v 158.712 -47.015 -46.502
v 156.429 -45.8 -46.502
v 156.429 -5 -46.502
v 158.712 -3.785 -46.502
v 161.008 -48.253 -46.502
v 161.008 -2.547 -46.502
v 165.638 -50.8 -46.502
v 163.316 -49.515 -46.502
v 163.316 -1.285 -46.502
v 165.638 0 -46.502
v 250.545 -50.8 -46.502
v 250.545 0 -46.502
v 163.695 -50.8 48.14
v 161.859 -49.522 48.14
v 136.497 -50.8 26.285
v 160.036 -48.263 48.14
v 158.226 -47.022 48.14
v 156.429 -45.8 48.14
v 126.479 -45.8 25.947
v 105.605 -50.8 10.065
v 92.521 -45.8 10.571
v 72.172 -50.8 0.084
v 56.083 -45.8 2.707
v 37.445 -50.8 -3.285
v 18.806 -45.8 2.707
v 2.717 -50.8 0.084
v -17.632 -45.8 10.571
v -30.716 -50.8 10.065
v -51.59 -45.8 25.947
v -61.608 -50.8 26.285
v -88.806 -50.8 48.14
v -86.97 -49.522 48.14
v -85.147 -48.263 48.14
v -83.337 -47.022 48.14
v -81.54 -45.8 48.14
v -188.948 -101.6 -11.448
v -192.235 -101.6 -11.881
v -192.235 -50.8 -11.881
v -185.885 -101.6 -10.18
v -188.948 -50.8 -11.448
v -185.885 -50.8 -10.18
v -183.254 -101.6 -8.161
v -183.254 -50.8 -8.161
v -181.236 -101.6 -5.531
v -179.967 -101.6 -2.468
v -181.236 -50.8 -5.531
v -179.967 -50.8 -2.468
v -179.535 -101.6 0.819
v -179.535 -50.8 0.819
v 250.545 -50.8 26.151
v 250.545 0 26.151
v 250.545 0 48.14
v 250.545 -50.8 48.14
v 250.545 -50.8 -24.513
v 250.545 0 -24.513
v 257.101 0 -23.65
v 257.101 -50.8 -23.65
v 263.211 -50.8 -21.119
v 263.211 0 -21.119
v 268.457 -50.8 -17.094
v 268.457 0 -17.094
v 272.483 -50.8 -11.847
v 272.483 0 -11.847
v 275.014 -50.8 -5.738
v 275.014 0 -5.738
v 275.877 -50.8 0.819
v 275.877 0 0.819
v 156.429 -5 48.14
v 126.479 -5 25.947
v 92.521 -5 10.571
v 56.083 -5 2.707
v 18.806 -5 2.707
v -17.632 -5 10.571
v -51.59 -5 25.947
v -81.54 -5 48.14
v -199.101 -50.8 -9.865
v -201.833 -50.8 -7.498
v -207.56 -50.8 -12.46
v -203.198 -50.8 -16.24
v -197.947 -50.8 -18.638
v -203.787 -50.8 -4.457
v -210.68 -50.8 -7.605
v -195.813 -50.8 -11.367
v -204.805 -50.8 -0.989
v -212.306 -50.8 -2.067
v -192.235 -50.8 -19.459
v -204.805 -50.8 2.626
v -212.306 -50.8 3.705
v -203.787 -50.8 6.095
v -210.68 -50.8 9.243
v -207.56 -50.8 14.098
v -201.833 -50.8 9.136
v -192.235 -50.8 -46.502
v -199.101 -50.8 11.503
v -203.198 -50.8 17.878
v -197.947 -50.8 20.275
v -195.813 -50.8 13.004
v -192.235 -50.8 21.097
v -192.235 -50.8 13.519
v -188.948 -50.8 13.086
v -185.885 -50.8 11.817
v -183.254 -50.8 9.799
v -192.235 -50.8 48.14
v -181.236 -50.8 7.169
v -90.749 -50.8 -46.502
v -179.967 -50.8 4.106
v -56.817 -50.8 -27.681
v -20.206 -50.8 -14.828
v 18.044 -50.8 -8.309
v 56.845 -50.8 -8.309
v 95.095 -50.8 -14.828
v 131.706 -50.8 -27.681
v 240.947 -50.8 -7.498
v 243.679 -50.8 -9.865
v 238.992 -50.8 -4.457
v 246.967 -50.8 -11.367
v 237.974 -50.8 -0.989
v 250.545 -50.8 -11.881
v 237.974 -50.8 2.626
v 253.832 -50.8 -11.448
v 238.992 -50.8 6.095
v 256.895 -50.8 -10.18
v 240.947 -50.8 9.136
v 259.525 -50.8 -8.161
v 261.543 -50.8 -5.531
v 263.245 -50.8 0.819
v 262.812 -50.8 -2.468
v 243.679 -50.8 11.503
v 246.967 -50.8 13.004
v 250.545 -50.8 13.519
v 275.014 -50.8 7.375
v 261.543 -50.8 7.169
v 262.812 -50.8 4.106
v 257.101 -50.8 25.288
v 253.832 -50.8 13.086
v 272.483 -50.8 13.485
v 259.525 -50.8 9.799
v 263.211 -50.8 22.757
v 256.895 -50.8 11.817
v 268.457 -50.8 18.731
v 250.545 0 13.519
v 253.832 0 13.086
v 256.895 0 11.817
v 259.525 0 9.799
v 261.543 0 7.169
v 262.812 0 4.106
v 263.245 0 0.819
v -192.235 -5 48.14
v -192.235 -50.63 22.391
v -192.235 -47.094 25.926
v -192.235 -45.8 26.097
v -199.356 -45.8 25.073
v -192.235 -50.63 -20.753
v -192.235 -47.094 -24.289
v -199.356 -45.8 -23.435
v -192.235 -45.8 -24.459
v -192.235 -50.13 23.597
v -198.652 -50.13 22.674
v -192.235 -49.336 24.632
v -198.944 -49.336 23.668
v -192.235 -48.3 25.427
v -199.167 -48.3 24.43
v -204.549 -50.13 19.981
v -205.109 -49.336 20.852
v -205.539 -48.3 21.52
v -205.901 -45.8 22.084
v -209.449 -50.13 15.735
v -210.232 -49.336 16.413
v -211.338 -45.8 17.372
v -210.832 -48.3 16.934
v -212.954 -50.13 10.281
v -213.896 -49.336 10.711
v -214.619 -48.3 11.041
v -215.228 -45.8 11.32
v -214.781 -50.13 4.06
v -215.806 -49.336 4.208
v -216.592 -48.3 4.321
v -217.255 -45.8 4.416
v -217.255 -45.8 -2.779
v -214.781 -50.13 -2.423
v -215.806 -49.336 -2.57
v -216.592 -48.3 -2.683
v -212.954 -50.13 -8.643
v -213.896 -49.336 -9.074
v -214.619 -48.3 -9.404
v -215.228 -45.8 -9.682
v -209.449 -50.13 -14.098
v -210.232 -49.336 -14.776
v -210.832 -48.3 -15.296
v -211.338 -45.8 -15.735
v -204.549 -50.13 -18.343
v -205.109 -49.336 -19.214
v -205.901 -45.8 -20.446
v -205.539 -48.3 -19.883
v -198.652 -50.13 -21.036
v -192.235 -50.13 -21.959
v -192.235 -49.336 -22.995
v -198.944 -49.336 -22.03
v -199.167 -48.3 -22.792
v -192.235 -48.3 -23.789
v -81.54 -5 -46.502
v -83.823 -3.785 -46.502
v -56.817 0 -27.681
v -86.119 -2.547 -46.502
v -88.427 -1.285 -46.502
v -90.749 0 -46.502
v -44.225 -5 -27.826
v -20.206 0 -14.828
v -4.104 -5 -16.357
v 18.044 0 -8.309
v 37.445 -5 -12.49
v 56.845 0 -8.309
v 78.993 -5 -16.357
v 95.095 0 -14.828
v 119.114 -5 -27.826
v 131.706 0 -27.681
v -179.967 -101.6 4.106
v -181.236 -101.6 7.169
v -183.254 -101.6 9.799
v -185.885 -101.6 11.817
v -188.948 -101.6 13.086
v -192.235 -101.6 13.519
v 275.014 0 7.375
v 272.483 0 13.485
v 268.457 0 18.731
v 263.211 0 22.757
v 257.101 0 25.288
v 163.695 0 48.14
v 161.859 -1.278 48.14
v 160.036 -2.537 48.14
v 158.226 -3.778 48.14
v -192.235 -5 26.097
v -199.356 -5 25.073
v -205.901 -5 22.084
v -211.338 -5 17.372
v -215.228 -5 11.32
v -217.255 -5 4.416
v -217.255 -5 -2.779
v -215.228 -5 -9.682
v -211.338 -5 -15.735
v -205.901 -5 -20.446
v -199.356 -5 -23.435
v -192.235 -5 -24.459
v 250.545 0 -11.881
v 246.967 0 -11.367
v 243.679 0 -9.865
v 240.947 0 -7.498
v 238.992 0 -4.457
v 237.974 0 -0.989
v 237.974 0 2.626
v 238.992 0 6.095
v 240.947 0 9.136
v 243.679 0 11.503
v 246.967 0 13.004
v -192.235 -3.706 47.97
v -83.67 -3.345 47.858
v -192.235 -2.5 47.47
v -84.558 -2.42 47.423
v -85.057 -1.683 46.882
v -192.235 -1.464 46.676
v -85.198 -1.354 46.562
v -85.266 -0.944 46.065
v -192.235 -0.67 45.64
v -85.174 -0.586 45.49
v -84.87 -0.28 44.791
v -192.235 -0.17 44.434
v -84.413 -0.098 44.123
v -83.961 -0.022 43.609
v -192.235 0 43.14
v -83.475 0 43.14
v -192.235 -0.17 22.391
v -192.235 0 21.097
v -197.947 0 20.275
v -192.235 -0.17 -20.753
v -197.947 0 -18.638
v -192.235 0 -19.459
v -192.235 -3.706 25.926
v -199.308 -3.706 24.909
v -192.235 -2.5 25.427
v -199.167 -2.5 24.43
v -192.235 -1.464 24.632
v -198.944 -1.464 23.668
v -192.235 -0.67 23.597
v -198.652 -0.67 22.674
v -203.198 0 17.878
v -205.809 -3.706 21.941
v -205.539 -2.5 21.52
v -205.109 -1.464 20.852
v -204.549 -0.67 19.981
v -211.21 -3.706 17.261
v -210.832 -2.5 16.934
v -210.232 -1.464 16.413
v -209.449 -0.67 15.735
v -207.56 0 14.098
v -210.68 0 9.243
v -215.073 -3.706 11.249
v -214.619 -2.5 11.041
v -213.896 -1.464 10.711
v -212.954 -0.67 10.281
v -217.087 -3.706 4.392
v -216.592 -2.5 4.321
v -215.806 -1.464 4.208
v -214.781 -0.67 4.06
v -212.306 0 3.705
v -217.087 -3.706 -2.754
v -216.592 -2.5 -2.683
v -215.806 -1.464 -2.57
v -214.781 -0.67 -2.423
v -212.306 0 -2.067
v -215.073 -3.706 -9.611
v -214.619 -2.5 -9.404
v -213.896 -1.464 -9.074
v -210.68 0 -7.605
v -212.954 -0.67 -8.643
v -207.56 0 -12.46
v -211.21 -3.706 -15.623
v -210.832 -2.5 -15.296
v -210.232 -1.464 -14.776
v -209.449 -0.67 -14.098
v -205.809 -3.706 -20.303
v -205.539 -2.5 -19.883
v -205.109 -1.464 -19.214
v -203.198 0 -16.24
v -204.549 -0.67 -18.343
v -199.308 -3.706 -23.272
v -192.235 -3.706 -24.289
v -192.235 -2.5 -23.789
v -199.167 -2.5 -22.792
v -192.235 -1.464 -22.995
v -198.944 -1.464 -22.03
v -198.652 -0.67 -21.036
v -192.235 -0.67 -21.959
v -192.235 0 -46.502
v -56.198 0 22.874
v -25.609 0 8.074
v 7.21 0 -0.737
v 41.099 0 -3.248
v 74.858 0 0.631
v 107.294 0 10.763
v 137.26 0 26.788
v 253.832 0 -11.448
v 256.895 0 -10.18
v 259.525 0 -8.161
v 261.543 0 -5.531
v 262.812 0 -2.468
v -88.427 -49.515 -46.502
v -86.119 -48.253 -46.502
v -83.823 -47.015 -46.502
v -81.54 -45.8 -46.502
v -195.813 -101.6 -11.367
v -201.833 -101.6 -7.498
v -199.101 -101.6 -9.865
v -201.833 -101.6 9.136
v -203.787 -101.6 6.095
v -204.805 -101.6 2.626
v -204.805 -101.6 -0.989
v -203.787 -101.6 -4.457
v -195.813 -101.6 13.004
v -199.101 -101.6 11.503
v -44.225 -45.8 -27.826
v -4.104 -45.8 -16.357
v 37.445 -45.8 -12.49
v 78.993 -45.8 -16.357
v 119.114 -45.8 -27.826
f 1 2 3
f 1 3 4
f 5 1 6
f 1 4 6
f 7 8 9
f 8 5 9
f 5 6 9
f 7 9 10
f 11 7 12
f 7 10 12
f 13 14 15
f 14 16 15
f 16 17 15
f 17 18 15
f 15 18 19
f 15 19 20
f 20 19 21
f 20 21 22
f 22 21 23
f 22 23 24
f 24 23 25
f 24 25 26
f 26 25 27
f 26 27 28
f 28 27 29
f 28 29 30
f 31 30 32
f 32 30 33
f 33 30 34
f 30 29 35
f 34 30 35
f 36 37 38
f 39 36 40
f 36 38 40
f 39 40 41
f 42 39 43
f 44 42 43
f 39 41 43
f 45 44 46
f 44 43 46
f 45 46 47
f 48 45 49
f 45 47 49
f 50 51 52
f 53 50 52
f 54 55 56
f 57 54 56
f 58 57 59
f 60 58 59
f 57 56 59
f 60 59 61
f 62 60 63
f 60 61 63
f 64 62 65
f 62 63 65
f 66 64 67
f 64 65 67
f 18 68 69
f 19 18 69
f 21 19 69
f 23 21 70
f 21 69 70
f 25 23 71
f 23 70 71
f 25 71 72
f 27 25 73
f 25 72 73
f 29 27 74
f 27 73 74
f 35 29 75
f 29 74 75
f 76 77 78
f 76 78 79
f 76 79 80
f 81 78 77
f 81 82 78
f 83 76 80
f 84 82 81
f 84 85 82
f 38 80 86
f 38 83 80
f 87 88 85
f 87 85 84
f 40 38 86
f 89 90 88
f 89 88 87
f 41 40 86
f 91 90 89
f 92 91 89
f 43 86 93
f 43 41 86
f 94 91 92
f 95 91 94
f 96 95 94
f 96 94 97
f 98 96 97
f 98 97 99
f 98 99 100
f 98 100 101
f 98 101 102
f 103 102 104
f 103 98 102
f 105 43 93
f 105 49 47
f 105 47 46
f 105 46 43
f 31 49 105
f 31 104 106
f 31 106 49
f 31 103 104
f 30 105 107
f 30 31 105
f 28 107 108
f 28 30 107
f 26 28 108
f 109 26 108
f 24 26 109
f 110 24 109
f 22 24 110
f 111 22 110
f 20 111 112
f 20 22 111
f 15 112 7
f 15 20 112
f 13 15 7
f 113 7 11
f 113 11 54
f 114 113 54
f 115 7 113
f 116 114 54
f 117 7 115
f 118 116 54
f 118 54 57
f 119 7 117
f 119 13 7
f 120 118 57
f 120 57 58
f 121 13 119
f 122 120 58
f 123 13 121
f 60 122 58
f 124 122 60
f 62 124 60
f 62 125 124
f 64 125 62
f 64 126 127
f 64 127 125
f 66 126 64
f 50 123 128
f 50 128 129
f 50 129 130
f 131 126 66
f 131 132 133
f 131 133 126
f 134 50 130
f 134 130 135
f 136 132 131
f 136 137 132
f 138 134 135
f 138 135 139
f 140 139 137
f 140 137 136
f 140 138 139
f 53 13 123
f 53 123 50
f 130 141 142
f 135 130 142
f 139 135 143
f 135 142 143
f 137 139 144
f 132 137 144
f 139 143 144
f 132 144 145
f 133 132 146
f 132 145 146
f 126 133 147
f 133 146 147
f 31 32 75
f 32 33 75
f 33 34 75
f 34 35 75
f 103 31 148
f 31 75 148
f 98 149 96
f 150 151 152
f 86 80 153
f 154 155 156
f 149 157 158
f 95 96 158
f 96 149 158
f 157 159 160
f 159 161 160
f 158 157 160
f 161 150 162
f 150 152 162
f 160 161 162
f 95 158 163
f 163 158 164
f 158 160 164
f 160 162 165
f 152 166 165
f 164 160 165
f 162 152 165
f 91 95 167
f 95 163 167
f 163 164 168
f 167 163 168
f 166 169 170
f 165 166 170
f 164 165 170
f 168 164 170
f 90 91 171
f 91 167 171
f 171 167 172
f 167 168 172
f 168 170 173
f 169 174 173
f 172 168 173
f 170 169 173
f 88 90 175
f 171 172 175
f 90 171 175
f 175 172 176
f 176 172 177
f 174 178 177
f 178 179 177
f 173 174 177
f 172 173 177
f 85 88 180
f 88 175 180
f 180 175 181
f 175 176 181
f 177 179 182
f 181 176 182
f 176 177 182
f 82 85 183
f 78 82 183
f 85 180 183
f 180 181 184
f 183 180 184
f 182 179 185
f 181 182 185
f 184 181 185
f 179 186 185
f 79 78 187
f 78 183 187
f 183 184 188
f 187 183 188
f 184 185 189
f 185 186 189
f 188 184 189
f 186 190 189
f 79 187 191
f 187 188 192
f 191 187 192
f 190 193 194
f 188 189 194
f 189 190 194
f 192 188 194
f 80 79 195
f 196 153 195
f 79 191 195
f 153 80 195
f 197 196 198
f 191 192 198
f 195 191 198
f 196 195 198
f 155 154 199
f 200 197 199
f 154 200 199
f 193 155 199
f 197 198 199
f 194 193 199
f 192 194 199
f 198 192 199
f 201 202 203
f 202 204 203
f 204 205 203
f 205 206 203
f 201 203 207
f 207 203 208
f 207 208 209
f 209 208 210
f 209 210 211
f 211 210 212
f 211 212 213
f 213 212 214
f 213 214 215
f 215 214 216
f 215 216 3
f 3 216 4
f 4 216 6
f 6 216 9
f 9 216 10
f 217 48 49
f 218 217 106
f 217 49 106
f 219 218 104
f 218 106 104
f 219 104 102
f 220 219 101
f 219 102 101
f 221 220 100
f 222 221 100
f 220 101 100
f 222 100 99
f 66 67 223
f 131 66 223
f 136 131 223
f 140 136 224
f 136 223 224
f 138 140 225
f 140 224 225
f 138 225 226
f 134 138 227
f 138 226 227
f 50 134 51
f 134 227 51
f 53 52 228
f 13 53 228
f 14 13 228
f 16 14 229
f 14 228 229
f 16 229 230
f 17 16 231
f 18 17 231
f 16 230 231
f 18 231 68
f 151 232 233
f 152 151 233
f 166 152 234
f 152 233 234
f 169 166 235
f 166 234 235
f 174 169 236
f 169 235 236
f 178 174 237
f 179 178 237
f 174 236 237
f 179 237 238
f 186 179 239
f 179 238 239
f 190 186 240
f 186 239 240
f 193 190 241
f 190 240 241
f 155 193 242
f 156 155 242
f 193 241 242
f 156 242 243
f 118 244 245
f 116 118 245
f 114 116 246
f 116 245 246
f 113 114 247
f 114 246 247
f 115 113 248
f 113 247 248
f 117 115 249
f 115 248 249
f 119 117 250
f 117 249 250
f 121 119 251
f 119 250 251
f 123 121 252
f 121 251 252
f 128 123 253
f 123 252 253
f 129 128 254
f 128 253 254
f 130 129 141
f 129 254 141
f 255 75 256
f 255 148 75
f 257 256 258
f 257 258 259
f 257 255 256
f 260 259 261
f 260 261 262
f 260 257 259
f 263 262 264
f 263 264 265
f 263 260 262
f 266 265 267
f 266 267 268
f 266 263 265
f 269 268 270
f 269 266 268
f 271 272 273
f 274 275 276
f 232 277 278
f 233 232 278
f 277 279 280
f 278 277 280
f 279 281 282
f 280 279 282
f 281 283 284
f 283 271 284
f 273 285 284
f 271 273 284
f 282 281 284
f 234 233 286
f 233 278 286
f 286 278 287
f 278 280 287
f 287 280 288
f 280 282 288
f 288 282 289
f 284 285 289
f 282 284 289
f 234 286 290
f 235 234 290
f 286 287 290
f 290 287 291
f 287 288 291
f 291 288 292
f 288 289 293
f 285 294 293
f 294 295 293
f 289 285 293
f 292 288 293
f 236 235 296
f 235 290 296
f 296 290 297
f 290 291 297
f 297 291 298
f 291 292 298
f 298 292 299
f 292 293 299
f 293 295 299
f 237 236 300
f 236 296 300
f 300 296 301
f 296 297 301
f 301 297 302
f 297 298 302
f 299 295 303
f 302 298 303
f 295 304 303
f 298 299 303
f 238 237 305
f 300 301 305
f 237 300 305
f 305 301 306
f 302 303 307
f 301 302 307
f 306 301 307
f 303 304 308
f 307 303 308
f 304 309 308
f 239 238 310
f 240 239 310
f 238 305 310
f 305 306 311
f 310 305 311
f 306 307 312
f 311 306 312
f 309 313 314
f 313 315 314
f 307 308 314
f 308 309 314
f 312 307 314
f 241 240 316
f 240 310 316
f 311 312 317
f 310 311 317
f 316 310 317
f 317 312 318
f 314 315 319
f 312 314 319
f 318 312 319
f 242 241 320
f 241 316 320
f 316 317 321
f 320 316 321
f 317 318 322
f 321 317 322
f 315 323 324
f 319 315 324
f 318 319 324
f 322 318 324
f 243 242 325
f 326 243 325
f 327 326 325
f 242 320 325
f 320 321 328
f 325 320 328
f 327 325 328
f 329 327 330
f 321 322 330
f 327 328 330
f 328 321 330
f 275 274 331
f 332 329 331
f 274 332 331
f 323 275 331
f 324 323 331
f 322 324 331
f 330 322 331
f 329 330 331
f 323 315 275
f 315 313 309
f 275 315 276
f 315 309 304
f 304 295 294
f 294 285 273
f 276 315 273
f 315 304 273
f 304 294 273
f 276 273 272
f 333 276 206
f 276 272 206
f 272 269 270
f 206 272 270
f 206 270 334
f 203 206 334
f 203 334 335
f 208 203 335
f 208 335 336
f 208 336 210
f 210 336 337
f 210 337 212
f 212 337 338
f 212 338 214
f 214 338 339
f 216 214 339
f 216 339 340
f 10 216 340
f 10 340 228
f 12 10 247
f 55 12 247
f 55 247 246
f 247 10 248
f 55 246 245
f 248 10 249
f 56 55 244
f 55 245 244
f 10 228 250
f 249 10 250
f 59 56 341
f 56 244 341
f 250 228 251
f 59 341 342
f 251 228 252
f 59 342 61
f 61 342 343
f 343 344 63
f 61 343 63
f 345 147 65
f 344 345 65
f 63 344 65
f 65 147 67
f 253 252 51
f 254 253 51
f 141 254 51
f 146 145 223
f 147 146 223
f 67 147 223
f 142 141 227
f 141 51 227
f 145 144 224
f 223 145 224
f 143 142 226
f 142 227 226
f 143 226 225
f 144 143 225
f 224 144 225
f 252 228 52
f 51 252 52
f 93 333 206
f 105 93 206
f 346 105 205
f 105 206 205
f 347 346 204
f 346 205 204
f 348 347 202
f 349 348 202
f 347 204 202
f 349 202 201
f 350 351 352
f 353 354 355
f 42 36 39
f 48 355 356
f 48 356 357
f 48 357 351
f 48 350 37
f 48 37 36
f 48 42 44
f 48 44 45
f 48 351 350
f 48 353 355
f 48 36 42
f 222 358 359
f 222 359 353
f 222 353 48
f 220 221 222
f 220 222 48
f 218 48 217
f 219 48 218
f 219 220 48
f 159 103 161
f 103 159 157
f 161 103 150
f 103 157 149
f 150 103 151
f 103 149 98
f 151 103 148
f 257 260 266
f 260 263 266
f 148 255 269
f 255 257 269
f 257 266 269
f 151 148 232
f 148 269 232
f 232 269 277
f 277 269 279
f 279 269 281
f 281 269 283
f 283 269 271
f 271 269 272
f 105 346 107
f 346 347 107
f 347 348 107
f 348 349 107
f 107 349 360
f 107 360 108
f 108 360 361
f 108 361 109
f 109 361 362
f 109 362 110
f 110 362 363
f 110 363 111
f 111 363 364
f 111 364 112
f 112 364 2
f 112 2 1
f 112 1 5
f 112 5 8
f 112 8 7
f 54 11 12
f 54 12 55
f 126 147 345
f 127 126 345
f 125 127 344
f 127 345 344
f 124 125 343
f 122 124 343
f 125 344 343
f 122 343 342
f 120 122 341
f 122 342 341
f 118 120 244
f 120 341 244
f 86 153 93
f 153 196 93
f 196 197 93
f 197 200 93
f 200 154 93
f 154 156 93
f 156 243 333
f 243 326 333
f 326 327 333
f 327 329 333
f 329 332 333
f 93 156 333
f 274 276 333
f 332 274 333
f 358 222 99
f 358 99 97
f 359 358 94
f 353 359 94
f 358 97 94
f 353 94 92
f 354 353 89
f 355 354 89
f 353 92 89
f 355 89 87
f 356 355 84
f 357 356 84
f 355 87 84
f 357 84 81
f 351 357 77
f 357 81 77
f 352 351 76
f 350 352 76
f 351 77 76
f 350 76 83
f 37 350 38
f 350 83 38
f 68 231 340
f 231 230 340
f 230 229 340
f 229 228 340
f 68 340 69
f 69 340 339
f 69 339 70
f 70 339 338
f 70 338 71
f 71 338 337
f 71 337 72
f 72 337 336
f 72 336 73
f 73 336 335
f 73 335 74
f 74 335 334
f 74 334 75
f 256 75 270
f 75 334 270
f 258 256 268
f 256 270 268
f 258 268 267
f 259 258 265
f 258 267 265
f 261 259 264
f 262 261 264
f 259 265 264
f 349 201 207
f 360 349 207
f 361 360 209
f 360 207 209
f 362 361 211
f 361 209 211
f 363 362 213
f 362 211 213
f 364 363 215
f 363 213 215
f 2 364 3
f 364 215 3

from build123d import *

# Parameters (mm, degrees)
F1_DEPTH = 50.8
F2_DEPTH = 50.8
F3_DEPTH = 25.4
F4_DEPTH = 101.6
F5_SIZE  = 5
F6_R     = 5


with BuildPart() as f1:
    # F0 (on Front) → F1 (new body)
    with BuildSketch(Plane.XZ):
        with BuildLine():
            Line((-81.5396818683, 48.140194267), (-192.2345156552, 48.140194267))
            Line((-192.2345156552, 48.140194267), (-192.2345156552, 26.0968099283))
            ThreePointArc((-192.2345156552, 26.0968099283), (-174.3603015656, 18.6930680356), (-166.956559673, 0.8188539461))
            ThreePointArc((-166.956559673, 0.8188539461), (-174.3603015656, -17.0553601435), (-192.2345156552, -24.4591020361))
            Line((-192.2345156552, -24.4591020361), (-192.2345156552, -46.5024863749))
            Line((-192.2345156552, -46.5024863749), (-81.5396818683, -46.5024863749))
            ThreePointArc((-81.5396818683, -46.5024863749), (37.4445138693, -12.4899673839), (156.4287096069, -46.5024863749))
            Line((156.4287096069, -46.5024863749), (250.5448194923, -46.5024863749))
            Line((250.5448194923, -46.5024863749), (250.5448194923, -24.5132009882))
            ThreePointArc((250.5448194923, -24.5132009882), (225.212764558, 0.8188539461), (250.5448194923, 26.1509088804))
            Line((250.5448194923, 26.1509088804), (250.5448194923, 48.140194267))
            Line((250.5448194923, 48.140194267), (156.4287096069, 48.140194267))
            ThreePointArc((156.4287096069, 48.140194267), (37.4445138693, 1.7154132922), (-81.5396818683, 48.140194267))
        make_face()
    extrude(amount=F1_DEPTH)

    # F0 (on Front) → F2 (join)
    with BuildSketch(Plane.XZ):
        with BuildLine():
            Line((-81.5396818683, 48.140194267), (-192.2345156552, 48.140194267))
            Line((-192.2345156552, 48.140194267), (-192.2345156552, 26.0968099283))
            ThreePointArc((-192.2345156552, 26.0968099283), (-174.3603015656, 18.6930680356), (-166.956559673, 0.8188539461))
            ThreePointArc((-166.956559673, 0.8188539461), (-174.3603015656, -17.0553601435), (-192.2345156552, -24.4591020361))
            Line((-192.2345156552, -24.4591020361), (-192.2345156552, -46.5024863749))
            Line((-192.2345156552, -46.5024863749), (-81.5396818683, -46.5024863749))
            ThreePointArc((-81.5396818683, -46.5024863749), (37.4445138693, -12.4899673839), (156.4287096069, -46.5024863749))
            Line((156.4287096069, -46.5024863749), (250.5448194923, -46.5024863749))
            Line((250.5448194923, -46.5024863749), (250.5448194923, -24.5132009882))
            ThreePointArc((250.5448194923, -24.5132009882), (225.212764558, 0.8188539461), (250.5448194923, 26.1509088804))
            Line((250.5448194923, 26.1509088804), (250.5448194923, 48.140194267))
            Line((250.5448194923, 48.140194267), (156.4287096069, 48.140194267))
            ThreePointArc((156.4287096069, 48.140194267), (37.4445138693, 1.7154132922), (-81.5396818683, 48.140194267))
        make_face()
        with BuildLine():
            ThreePointArc((-166.956559673, 0.8188539461), (-174.3603015656, 18.6930680356), (-192.2345156552, 26.0968099283))
            Line((-192.2345156552, 26.0968099283), (-192.2345156552, 13.5188539461))
            ThreePointArc((-192.2345156552, 13.5188539461), (-183.2542595341, 9.7991100672), (-179.5345156552, 0.8188539461))
            ThreePointArc((-179.5345156552, 0.8188539461), (-183.2542595341, -8.161402175), (-192.2345156552, -11.8811460539))
            Line((-192.2345156552, -11.8811460539), (-192.2345156552, -24.4591020361))
            ThreePointArc((-192.2345156552, -24.4591020361), (-174.3603015656, -17.0553601435), (-166.956559673, 0.8188539461))
        make_face()
        with BuildLine():
            Line((-192.2345156552, 13.5188539461), (-192.2345156552, 26.0968099283))
            ThreePointArc((-192.2345156552, 26.0968099283), (-217.5124716374, 0.8188539461), (-192.2345156552, -24.4591020361))
            Line((-192.2345156552, -24.4591020361), (-192.2345156552, -11.8811460539))
            ThreePointArc((-192.2345156552, -11.8811460539), (-204.9345156552, 0.8188539461), (-192.2345156552, 13.5188539461))
        make_face()
        with BuildLine():
            ThreePointArc((275.8768744265, 0.8188539461), (268.4572873177, 18.7313217715), (250.5448194923, 26.1509088804))
            Line((250.5448194923, 26.1509088804), (250.5448194923, 13.5188539461))
            ThreePointArc((250.5448194923, 13.5188539461), (259.5250756133, 9.7991100672), (263.2448194923, 0.8188539461))
            ThreePointArc((263.2448194923, 0.8188539461), (259.5250756133, -8.161402175), (250.5448194923, -11.8811460539))
            Line((250.5448194923, -11.8811460539), (250.5448194923, -24.5132009882))
            ThreePointArc((250.5448194923, -24.5132009882), (268.4572873177, -17.0936138793), (275.8768744265, 0.8188539461))
        make_face()
        with BuildLine():
            Line((250.5448194923, 13.5188539461), (250.5448194923, 26.1509088804))
            ThreePointArc((250.5448194923, 26.1509088804), (225.212764558, 0.8188539461), (250.5448194923, -24.5132009882))
            Line((250.5448194923, -24.5132009882), (250.5448194923, -11.8811460539))
            ThreePointArc((250.5448194923, -11.8811460539), (237.8448194923, 0.8188539461), (250.5448194923, 13.5188539461))
        make_face()
    extrude(amount=F2_DEPTH)

    # F0 (on Front) → F3 (join)
    with BuildSketch(Plane.XZ):
        with BuildLine():
            Line((-81.5396818683, 48.140194267), (-192.2345156552, 48.140194267))
            Line((-192.2345156552, 48.140194267), (-192.2345156552, 26.0968099283))
            ThreePointArc((-192.2345156552, 26.0968099283), (-174.3603015656, 18.6930680356), (-166.956559673, 0.8188539461))
            ThreePointArc((-166.956559673, 0.8188539461), (-174.3603015656, -17.0553601435), (-192.2345156552, -24.4591020361))
            Line((-192.2345156552, -24.4591020361), (-192.2345156552, -46.5024863749))
            Line((-192.2345156552, -46.5024863749), (-81.5396818683, -46.5024863749))
            ThreePointArc((-81.5396818683, -46.5024863749), (37.4445138693, -12.4899673839), (156.4287096069, -46.5024863749))
            Line((156.4287096069, -46.5024863749), (250.5448194923, -46.5024863749))
            Line((250.5448194923, -46.5024863749), (250.5448194923, -24.5132009882))
            ThreePointArc((250.5448194923, -24.5132009882), (225.212764558, 0.8188539461), (250.5448194923, 26.1509088804))
            Line((250.5448194923, 26.1509088804), (250.5448194923, 48.140194267))
            Line((250.5448194923, 48.140194267), (156.4287096069, 48.140194267))
            ThreePointArc((156.4287096069, 48.140194267), (37.4445138693, 1.7154132922), (-81.5396818683, 48.140194267))
        make_face()
        with BuildLine():
            ThreePointArc((-166.956559673, 0.8188539461), (-174.3603015656, 18.6930680356), (-192.2345156552, 26.0968099283))
            Line((-192.2345156552, 26.0968099283), (-192.2345156552, 13.5188539461))
            ThreePointArc((-192.2345156552, 13.5188539461), (-183.2542595341, 9.7991100672), (-179.5345156552, 0.8188539461))
            ThreePointArc((-179.5345156552, 0.8188539461), (-183.2542595341, -8.161402175), (-192.2345156552, -11.8811460539))
            Line((-192.2345156552, -11.8811460539), (-192.2345156552, -24.4591020361))
            ThreePointArc((-192.2345156552, -24.4591020361), (-174.3603015656, -17.0553601435), (-166.956559673, 0.8188539461))
        make_face()
        with BuildLine():
            Line((-192.2345156552, 13.5188539461), (-192.2345156552, 26.0968099283))
            ThreePointArc((-192.2345156552, 26.0968099283), (-217.5124716374, 0.8188539461), (-192.2345156552, -24.4591020361))
            Line((-192.2345156552, -24.4591020361), (-192.2345156552, -11.8811460539))
            ThreePointArc((-192.2345156552, -11.8811460539), (-204.9345156552, 0.8188539461), (-192.2345156552, 13.5188539461))
        make_face()
        with BuildLine():
            ThreePointArc((275.8768744265, 0.8188539461), (268.4572873177, 18.7313217715), (250.5448194923, 26.1509088804))
            Line((250.5448194923, 26.1509088804), (250.5448194923, 13.5188539461))
            ThreePointArc((250.5448194923, 13.5188539461), (259.5250756133, 9.7991100672), (263.2448194923, 0.8188539461))
            ThreePointArc((263.2448194923, 0.8188539461), (259.5250756133, -8.161402175), (250.5448194923, -11.8811460539))
            Line((250.5448194923, -11.8811460539), (250.5448194923, -24.5132009882))
            ThreePointArc((250.5448194923, -24.5132009882), (268.4572873177, -17.0936138793), (275.8768744265, 0.8188539461))
        make_face()
        with BuildLine():
            Line((250.5448194923, 13.5188539461), (250.5448194923, 26.1509088804))
            ThreePointArc((250.5448194923, 26.1509088804), (225.212764558, 0.8188539461), (250.5448194923, -24.5132009882))
            Line((250.5448194923, -24.5132009882), (250.5448194923, -11.8811460539))
            ThreePointArc((250.5448194923, -11.8811460539), (237.8448194923, 0.8188539461), (250.5448194923, 13.5188539461))
        make_face()
    extrude(amount=F3_DEPTH)

    # F0 (on Front) → F4 (join)
    with BuildSketch(Plane.XZ):
        with BuildLine():
            ThreePointArc((-179.5345156552, 0.8188539461), (-183.2542595341, 9.7991100672), (-192.2345156552, 13.5188539461))
            ThreePointArc((-192.2345156552, 13.5188539461), (-204.9345156552, 0.8188539461), (-192.2345156552, -11.8811460539))
            ThreePointArc((-192.2345156552, -11.8811460539), (-183.2542595341, -8.161402175), (-179.5345156552, 0.8188539461))
        make_face()
    extrude(amount=F4_DEPTH)

    # F5
    f5_edges = [f1.edges().sort_by_distance(p)[0] for p in [
        (37.444514, 0, 1.715413),
        (37.444514, 0, -12.489967),
        (37.444514, -50.8, 1.715413),
        (37.444514, -50.8, -12.489967),
    ]]
    chamfer(f5_edges, length=F5_SIZE)

    # F6
    f6_edges = [f1.edges().sort_by_distance(p)[0] for p in [
        (-140.520101, 0, 48.140194),
        (-217.512472, 0, 0.818854),
        (-217.512472, -50.8, 0.818854),
    ]]
    fillet(f6_edges, radius=F6_R)


solid = f1.part
